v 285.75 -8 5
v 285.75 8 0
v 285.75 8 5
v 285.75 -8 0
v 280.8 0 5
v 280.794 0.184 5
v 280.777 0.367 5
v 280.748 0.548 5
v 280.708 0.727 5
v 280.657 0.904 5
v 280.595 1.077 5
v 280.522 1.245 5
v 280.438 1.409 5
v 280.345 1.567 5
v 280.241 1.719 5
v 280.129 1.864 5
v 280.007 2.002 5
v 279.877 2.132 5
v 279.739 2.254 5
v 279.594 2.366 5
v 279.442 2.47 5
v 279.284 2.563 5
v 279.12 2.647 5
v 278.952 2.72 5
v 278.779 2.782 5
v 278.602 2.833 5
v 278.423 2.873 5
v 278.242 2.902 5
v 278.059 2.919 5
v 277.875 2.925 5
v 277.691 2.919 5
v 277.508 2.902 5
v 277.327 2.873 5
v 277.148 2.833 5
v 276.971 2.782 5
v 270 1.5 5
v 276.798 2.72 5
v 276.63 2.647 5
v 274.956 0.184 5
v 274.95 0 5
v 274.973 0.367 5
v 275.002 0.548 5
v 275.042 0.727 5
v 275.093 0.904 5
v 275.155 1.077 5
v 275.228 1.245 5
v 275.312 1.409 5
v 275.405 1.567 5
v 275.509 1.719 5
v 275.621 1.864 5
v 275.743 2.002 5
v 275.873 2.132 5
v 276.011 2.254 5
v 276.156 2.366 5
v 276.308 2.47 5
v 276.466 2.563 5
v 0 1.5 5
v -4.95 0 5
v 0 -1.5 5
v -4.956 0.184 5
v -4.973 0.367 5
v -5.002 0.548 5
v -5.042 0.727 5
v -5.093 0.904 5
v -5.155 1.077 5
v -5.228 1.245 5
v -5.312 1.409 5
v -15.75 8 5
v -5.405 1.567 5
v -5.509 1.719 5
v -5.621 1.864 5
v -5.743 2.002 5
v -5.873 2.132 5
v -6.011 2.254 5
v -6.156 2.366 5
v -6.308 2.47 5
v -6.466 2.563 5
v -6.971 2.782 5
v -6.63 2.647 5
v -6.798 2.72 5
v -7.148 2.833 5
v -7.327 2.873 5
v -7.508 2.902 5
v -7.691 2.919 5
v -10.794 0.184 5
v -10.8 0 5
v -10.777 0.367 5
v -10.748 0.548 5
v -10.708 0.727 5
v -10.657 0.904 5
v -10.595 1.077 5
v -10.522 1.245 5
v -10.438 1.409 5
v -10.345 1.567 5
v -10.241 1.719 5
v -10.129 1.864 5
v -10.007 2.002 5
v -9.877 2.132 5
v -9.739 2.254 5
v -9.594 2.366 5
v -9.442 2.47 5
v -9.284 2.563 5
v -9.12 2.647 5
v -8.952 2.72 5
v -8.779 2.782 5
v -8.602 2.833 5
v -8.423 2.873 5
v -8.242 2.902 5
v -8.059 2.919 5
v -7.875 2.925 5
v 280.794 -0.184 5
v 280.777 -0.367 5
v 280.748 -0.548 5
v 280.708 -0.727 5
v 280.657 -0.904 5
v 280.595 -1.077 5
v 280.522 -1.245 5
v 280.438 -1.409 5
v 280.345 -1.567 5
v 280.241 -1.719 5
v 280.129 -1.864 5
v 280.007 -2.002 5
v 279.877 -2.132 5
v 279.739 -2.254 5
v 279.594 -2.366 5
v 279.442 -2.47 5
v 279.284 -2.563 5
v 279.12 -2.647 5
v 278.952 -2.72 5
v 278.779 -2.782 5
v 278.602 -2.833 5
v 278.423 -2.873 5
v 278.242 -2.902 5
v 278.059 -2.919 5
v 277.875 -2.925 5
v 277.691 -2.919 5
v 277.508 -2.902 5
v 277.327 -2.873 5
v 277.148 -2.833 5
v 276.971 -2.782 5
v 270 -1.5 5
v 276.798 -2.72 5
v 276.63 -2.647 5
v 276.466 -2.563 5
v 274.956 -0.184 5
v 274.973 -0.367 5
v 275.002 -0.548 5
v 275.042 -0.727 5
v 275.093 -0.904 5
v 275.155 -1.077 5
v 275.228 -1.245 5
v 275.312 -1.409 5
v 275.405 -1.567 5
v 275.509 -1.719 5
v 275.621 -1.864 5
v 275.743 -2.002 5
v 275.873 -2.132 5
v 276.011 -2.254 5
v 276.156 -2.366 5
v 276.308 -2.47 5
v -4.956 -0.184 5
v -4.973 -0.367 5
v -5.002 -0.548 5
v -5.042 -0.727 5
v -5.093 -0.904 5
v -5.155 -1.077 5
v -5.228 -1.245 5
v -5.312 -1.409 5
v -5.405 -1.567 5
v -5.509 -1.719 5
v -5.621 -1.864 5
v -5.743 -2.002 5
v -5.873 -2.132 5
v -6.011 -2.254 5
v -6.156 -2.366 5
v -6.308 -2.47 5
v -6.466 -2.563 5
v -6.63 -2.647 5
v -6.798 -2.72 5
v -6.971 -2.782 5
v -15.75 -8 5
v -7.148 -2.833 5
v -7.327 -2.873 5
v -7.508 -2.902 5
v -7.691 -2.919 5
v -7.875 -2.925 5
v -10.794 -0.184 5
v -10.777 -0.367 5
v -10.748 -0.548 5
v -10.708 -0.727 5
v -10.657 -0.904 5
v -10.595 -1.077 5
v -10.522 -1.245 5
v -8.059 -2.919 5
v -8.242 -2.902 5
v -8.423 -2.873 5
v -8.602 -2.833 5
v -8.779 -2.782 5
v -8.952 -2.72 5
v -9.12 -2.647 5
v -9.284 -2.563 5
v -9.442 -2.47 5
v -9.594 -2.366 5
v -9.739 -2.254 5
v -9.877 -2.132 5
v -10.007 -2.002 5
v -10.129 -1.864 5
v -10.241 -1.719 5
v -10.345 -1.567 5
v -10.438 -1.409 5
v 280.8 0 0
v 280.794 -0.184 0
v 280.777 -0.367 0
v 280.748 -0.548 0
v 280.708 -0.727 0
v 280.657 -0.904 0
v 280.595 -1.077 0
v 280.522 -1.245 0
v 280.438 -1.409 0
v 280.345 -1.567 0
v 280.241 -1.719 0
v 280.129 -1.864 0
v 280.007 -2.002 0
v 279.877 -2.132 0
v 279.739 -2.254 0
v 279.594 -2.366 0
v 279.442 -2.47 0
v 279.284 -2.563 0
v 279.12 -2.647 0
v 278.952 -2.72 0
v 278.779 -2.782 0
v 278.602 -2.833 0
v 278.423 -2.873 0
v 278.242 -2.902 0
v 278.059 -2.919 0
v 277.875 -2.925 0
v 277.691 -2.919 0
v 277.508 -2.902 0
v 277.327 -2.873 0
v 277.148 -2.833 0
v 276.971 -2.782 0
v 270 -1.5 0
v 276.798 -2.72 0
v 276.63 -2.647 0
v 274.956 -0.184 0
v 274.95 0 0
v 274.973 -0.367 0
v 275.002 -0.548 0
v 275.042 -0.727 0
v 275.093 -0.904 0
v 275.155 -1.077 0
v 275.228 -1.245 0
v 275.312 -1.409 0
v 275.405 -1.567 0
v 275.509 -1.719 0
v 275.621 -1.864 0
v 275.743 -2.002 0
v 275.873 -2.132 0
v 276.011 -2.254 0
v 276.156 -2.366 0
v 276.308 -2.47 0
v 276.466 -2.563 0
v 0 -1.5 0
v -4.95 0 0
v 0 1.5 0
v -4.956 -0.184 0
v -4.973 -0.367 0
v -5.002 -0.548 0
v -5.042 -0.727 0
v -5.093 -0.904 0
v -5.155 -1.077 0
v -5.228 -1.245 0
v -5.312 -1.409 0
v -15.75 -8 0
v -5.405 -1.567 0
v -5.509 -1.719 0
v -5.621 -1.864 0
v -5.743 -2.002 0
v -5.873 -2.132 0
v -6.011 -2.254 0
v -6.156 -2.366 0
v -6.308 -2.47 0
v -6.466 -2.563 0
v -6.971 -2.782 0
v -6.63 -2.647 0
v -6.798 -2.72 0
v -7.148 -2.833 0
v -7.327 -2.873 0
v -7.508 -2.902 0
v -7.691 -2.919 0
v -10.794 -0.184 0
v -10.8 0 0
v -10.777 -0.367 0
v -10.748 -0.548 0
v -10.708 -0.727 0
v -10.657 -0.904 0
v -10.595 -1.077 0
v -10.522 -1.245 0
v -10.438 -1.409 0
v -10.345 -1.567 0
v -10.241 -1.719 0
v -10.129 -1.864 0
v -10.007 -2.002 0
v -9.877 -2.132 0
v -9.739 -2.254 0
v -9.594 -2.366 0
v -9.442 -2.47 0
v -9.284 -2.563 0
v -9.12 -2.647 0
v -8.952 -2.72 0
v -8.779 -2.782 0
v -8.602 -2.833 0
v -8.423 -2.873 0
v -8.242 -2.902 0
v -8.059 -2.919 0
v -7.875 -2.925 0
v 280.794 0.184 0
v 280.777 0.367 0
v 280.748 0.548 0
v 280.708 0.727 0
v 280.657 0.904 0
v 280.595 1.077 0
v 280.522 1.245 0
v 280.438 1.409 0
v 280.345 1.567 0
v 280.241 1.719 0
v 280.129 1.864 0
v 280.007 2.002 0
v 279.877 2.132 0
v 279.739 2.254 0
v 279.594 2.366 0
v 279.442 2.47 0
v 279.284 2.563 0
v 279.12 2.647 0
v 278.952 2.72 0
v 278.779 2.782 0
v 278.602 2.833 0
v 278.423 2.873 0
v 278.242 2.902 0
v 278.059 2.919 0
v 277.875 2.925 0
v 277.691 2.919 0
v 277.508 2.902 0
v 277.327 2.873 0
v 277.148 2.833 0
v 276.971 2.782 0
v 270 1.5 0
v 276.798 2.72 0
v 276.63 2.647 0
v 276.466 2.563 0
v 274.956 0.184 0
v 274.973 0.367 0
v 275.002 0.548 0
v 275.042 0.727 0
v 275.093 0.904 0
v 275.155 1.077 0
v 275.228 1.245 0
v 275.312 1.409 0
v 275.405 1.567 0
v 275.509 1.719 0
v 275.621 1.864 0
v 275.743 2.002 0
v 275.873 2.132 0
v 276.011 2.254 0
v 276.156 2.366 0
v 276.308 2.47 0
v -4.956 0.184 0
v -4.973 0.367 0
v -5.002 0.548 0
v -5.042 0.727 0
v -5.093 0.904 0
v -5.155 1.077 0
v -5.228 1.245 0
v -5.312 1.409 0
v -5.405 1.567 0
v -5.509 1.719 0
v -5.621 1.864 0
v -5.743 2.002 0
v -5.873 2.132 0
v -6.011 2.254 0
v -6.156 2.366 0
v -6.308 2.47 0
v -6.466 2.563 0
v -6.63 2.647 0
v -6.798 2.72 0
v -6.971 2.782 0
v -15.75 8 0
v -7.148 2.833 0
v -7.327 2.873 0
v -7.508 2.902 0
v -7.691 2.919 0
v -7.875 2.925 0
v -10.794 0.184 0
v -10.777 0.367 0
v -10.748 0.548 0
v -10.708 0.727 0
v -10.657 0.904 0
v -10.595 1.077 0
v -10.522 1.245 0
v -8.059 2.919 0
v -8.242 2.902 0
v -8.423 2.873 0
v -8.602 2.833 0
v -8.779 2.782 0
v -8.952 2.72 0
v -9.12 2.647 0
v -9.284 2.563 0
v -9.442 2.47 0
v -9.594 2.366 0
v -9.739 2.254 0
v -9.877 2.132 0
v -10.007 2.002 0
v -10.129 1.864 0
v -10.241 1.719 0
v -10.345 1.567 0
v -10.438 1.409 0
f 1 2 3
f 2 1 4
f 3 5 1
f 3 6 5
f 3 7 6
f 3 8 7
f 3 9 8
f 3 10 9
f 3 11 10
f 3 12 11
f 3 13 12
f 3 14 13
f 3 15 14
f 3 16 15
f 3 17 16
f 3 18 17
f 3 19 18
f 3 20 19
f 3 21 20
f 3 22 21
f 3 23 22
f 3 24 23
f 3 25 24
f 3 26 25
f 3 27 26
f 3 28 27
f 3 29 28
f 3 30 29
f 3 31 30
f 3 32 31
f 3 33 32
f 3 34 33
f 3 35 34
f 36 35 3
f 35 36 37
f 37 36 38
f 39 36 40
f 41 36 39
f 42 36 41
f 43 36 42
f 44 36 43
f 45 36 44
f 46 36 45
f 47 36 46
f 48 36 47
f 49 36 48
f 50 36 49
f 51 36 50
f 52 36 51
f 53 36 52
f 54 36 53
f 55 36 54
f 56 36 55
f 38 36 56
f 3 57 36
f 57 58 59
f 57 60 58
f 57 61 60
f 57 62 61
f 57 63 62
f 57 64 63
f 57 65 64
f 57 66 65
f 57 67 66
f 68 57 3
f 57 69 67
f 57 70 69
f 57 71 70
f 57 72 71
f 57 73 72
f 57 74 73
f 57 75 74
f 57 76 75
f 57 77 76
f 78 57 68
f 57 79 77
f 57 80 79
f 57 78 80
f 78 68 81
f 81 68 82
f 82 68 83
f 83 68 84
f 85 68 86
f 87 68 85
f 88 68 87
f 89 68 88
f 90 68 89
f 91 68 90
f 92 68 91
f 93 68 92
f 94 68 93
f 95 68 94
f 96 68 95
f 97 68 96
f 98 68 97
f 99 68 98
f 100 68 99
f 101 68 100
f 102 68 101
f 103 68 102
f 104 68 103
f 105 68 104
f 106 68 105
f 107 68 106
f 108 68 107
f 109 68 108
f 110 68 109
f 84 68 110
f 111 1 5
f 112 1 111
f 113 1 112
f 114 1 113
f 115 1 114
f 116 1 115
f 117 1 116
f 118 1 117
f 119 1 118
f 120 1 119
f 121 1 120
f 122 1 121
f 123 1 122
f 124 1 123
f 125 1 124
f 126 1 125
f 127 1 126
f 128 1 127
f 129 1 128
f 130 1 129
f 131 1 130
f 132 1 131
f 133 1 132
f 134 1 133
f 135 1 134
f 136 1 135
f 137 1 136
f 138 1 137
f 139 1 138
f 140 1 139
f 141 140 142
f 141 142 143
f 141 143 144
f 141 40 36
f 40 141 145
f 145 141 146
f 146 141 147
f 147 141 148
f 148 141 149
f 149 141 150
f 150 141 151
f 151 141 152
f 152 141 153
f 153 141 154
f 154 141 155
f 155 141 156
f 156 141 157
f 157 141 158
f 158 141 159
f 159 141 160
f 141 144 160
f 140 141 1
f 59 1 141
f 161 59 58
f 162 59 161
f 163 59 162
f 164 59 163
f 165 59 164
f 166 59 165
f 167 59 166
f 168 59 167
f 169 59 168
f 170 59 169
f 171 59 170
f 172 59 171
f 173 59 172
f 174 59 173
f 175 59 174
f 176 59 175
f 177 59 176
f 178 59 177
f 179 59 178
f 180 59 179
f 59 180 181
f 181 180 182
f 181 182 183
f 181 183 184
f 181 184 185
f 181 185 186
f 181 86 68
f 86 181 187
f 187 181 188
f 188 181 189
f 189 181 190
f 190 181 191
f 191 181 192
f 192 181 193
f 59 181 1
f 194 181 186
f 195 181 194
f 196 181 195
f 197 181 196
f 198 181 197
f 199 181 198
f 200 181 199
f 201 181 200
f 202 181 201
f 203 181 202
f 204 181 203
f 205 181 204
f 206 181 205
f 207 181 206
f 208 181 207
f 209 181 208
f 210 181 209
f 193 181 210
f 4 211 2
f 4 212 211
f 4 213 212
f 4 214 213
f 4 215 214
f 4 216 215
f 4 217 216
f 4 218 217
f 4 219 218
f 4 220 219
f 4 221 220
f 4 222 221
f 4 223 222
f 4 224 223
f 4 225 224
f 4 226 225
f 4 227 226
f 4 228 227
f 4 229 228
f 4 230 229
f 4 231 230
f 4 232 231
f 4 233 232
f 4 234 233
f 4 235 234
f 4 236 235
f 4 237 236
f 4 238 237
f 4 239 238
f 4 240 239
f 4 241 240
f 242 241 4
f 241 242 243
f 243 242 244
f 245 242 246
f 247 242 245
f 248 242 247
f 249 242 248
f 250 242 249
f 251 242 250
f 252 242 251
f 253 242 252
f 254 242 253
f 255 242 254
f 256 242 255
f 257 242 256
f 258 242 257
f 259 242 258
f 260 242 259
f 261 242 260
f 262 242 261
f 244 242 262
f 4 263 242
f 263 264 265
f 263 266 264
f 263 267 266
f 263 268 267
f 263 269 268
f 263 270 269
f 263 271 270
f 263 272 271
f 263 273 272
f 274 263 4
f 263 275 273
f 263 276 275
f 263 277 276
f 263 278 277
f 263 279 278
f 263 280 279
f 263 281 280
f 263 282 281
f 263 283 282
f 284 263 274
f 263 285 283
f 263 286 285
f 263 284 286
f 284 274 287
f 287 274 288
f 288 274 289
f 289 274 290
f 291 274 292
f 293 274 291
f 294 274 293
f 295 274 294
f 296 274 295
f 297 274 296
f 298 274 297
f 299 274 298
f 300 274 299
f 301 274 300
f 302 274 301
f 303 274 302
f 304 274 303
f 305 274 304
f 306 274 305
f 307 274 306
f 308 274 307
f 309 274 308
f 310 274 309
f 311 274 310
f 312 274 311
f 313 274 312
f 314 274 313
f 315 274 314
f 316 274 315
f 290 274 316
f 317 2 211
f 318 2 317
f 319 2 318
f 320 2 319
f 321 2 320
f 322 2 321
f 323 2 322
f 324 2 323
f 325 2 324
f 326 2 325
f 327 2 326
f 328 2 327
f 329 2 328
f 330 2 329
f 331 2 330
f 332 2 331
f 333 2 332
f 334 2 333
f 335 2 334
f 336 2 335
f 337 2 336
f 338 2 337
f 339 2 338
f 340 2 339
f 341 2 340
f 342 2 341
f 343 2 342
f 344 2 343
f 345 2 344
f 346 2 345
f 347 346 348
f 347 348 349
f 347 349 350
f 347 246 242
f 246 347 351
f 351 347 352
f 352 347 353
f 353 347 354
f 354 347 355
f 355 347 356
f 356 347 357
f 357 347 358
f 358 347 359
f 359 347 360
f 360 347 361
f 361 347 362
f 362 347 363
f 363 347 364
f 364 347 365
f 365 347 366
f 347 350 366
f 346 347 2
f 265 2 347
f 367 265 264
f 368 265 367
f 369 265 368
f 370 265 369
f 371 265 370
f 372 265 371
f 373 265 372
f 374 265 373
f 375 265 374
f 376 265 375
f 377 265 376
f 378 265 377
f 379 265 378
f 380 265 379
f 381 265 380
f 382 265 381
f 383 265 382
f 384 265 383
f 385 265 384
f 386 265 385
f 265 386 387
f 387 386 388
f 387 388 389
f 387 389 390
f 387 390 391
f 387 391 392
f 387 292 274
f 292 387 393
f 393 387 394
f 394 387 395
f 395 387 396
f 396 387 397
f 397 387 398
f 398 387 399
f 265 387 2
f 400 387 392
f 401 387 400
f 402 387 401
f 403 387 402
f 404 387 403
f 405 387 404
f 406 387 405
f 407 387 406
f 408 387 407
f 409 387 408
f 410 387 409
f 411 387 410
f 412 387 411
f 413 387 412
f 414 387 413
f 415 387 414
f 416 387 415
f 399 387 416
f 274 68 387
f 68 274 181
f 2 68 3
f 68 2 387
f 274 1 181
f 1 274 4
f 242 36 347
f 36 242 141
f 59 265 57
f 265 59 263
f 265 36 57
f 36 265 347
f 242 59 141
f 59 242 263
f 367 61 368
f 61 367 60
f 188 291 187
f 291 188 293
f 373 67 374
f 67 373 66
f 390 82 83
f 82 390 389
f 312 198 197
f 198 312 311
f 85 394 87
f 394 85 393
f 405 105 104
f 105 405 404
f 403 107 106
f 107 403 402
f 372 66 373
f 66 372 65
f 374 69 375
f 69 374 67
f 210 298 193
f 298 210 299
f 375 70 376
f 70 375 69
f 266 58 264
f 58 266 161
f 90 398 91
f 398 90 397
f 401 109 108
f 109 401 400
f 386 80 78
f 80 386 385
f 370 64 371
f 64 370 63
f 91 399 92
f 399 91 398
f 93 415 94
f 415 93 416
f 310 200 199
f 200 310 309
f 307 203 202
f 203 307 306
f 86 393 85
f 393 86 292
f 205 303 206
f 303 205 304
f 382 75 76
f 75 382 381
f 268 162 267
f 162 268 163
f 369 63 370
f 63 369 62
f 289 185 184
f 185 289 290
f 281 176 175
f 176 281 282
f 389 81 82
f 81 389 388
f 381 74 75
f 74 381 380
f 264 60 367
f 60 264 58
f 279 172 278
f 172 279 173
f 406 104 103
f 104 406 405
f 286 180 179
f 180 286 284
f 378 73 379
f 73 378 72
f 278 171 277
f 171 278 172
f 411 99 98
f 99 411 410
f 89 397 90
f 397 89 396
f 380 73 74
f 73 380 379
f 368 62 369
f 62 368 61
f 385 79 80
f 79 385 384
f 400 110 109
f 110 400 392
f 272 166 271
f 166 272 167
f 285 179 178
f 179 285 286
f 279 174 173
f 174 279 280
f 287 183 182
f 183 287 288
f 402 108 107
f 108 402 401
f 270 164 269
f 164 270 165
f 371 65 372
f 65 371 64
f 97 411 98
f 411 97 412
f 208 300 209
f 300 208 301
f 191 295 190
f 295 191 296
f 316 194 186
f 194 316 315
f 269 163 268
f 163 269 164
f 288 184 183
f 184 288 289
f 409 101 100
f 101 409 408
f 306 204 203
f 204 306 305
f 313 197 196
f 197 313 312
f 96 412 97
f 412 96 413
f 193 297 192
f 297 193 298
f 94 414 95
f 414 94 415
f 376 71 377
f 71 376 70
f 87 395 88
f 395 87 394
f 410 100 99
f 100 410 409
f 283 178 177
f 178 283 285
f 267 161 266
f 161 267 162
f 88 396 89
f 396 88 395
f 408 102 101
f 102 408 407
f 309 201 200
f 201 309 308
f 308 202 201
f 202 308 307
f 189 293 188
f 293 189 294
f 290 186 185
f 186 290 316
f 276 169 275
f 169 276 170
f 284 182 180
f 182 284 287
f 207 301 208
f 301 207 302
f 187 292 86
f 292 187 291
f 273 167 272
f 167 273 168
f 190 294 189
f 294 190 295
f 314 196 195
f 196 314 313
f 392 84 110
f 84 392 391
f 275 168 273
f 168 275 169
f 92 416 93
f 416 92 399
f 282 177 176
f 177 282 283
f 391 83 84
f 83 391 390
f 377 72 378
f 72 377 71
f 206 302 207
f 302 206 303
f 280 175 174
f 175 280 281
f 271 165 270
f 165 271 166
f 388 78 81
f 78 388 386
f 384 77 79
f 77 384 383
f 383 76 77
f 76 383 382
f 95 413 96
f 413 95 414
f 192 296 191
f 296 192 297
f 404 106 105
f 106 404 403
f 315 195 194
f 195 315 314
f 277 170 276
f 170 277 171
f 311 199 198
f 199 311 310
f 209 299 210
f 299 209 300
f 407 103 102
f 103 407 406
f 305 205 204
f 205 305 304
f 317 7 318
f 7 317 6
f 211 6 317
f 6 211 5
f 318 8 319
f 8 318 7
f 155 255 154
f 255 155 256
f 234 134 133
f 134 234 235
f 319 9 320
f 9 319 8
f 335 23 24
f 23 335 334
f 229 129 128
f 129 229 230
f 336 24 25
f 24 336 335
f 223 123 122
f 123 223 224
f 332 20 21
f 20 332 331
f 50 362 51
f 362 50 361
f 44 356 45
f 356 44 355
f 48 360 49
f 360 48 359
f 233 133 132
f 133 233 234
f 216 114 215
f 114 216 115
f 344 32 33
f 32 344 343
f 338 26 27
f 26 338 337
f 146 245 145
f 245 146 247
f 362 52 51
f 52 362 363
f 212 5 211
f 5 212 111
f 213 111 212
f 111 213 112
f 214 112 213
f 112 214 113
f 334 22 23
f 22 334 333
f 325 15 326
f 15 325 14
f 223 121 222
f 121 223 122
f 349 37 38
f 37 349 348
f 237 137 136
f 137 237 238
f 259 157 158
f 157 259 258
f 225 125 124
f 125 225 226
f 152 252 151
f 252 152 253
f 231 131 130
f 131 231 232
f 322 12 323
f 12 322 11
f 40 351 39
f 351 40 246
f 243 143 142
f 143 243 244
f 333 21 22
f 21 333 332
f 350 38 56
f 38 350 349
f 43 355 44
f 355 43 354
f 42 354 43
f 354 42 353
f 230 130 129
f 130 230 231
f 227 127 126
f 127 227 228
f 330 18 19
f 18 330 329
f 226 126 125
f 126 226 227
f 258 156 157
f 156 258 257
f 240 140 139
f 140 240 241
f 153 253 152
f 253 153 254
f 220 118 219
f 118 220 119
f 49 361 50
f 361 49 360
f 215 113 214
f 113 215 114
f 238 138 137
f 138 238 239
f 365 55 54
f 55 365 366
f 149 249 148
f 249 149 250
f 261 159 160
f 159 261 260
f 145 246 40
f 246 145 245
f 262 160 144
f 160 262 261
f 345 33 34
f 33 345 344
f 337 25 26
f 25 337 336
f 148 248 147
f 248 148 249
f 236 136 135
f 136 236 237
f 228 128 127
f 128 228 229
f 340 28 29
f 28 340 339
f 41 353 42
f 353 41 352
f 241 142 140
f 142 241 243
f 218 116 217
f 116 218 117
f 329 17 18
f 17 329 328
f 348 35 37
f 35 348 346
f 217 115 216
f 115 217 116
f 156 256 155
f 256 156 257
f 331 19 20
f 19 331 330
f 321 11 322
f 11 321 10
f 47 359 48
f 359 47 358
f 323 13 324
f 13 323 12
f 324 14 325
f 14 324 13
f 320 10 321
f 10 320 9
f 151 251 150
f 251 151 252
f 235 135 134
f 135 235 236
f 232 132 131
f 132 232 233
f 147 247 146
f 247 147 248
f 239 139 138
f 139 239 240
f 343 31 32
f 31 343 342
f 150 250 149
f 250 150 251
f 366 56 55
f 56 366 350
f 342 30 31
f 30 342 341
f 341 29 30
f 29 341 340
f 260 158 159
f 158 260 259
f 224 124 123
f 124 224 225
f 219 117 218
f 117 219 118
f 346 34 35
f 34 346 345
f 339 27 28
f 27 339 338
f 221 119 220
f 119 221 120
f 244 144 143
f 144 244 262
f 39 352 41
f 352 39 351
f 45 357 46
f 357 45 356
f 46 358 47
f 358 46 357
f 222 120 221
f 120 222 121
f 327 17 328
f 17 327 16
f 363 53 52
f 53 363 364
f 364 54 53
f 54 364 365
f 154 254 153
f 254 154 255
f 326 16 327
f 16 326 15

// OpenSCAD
// file: strip-wire-lib.scad
module stripWireCuts(wireLength=10,stripInLength=5,stripOutLength=5) {
    translate([stripInLength - toolR, -toolWidth - (wireD / 2)]) {
        square([toolWidth, 2 * toolWidth + wireD]);
    }

    translate([stripInLength + wireLength - toolR, -toolWidth - (wireD / 2)]) {
        square([toolWidth, 2 * toolWidth + wireD]);
    }
}

module cutWireCuts(wireLength=10, stripInLength=5,stripOutLength=5) {
    translate([wireLength + stripInLength + stripOutLength, -toolWidth / 2]) {
        square([toolWidth, toolWidth]);
    }
}
// file: strip-wire-measurements.scad
stripLength = 5.2;
toolWidth = 1.5;
toolR = toolWidth / 2;
wireD = 3;
wireLength = 40;
stockLength = 270;
wallThickness = 5;
boltM=3;
sheetThickness = 3;
tThreadM=5.75;
tSlotWidth=8.5;
tSlotDepth=5;
// main file
include <strip-wire-measurements.scad>
include <strip-wire-lib.scad>

paddingWidth = wallThickness * 2 + 2 * toolWidth;
holdWidth = paddingWidth + wireD;

$fn=100;

difference() {
    union() {
        translate([ - wallThickness - wallThickness - tThreadM, - wallThickness - toolWidth - (wireD / 2)]) {
            cube([wallThickness * 4 + 2 * tThreadM + stockLength, holdWidth,wallThickness]);
        }
    }

    translate([0, -wireD/2, -0.01]) {
        cube([stockLength, wireD, wallThickness + 0.02]);
    }

    translate([-wallThickness - tThreadM / 2, 0, -0.01]) {
        cylinder(r=tThreadM/2+0.05,h=wallThickness + 0.03);
    }

    translate([stockLength + wallThickness + tThreadM / 2, 0, -0.01]) {
        cylinder(r=tThreadM/2+0.05,h=wallThickness + 0.03);
    }
}
